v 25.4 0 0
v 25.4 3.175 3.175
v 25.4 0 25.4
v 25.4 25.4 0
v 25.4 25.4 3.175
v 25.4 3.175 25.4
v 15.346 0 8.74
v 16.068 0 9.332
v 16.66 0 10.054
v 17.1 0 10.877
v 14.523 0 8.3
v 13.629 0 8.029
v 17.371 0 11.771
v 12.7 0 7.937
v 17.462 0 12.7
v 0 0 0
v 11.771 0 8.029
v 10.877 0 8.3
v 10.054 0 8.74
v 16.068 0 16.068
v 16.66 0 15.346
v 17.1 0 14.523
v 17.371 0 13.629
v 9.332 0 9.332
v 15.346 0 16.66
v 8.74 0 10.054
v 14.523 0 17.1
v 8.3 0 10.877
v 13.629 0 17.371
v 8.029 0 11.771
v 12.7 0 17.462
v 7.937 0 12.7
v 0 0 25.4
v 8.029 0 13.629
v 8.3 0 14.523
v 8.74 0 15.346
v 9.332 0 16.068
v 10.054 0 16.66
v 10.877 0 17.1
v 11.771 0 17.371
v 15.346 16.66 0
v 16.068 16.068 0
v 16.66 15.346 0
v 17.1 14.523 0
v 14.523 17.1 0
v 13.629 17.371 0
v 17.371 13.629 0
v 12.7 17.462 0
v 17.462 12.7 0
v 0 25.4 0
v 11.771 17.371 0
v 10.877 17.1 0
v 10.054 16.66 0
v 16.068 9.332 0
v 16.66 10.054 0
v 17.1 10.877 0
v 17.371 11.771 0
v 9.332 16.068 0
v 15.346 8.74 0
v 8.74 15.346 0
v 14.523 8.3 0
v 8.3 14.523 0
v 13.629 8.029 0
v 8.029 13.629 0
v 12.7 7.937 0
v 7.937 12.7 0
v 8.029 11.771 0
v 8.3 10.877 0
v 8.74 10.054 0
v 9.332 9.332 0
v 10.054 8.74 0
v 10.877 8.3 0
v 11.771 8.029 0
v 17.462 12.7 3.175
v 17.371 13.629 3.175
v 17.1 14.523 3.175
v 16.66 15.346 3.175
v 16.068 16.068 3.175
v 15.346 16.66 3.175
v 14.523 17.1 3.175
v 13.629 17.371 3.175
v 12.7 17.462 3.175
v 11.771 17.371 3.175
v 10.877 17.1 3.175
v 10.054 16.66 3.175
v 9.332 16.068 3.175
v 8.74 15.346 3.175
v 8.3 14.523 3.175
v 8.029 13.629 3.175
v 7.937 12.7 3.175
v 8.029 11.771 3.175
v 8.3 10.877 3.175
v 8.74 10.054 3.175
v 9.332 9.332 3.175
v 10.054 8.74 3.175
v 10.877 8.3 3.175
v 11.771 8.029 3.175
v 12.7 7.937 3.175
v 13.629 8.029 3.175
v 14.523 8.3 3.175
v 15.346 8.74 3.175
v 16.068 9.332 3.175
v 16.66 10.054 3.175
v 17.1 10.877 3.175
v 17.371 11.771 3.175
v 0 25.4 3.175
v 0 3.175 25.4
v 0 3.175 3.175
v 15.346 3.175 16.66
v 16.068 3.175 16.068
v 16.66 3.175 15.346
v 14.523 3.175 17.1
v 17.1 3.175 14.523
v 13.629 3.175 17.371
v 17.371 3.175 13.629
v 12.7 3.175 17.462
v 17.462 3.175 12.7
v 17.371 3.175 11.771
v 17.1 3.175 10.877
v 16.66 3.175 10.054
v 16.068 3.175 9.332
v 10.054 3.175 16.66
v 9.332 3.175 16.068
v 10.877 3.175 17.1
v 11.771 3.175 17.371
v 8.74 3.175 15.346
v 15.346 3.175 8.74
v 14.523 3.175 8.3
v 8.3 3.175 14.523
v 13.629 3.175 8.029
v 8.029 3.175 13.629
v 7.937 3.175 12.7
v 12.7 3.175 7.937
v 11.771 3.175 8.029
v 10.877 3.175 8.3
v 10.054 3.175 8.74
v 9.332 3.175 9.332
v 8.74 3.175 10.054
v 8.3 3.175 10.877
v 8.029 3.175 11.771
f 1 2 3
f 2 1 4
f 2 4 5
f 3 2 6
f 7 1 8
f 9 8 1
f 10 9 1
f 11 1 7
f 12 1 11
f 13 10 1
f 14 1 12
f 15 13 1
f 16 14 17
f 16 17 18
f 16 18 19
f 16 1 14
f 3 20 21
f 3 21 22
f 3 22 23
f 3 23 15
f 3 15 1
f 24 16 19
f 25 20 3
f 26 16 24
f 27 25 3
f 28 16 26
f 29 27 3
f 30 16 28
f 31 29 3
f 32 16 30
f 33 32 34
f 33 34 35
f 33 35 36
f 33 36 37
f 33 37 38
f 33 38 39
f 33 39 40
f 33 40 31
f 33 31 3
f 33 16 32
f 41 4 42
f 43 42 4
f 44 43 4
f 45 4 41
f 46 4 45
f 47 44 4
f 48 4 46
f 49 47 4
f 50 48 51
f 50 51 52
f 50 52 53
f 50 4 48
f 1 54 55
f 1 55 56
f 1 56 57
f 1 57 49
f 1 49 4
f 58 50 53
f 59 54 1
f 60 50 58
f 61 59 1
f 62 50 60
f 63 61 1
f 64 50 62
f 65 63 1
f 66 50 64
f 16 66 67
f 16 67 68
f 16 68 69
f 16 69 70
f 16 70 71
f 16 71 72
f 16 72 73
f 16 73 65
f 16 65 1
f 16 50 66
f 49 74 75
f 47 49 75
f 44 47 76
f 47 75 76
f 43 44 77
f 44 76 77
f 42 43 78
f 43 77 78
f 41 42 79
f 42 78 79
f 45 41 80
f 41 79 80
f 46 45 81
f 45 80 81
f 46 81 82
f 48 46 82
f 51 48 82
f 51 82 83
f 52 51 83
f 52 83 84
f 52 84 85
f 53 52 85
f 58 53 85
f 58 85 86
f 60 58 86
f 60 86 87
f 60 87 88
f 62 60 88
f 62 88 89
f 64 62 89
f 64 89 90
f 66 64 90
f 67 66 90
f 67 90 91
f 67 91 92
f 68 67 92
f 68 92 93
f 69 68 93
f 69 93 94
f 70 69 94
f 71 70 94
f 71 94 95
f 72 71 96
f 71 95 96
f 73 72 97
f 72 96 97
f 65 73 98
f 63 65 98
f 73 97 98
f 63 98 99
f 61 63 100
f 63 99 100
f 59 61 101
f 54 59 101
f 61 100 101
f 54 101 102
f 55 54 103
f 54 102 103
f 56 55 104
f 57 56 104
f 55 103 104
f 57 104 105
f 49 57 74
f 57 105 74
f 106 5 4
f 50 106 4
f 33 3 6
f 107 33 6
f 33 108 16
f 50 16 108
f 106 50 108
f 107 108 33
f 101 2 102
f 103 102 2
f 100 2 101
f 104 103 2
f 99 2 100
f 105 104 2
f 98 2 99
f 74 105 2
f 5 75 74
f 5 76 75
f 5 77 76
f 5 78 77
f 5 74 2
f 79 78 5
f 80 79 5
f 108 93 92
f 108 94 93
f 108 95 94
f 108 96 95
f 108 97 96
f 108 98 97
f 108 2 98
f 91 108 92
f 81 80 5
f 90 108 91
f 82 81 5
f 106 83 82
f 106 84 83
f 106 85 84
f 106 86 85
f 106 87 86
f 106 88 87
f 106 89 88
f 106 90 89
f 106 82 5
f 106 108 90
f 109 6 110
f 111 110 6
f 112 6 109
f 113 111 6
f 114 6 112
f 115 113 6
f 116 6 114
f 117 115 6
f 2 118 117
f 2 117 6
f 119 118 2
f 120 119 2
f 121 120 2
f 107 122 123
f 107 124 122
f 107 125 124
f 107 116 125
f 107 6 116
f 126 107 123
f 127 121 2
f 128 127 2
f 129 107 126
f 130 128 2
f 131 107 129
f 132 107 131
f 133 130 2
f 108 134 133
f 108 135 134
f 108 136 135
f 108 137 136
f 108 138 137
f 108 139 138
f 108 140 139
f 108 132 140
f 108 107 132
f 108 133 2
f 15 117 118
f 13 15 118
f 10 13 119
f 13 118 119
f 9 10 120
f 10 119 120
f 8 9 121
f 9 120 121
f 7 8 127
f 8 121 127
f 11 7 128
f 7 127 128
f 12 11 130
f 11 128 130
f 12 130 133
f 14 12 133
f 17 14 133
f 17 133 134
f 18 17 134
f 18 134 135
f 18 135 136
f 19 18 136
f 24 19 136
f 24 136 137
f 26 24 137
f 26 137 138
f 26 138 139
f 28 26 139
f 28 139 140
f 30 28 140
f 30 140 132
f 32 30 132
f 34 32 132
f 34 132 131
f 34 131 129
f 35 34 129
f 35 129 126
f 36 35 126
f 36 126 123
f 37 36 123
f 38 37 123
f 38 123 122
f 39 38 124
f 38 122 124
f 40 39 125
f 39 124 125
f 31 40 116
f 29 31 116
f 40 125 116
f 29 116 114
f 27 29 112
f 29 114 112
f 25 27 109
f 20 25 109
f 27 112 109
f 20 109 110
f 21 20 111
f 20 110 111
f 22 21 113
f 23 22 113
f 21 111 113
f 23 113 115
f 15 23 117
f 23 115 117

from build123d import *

# Parameters (mm, degrees)
BOSS_EXTRUDE1_DEPTH = 25.4
SKETCH2_R           = 4.7625
CUT_EXTRUDE1_DEPTH  = 25.4
SKETCH3_R           = 4.7625
CUT_EXTRUDE2_DEPTH  = 4.175


with BuildPart() as part:
    # Sketch1 → Boss-Extrude1 (new body)
    with BuildSketch(Plane(origin=(0, 0, 0), x_dir=(0, 0, -1), z_dir=(1, 0, 0))):
        Polygon((0, 0), (-25.4, 0), (-25.4, 3.175), (-3.175, 3.175), (-3.175, 25.4), (0, 25.4), align=None)
    extrude(amount=BOSS_EXTRUDE1_DEPTH)

    # Sketch2 → Cut-Extrude1 (cut)
    with BuildSketch(Plane(origin=(0, 3.175, 0), x_dir=(1, 0, 0), z_dir=(0, 1, 0))):
        with Locations((12.7, -12.7)):
            Circle(SKETCH2_R)
    extrude(amount=-CUT_EXTRUDE1_DEPTH, mode=Mode.SUBTRACT)

    # Sketch3 → Cut-Extrude2 (cut, through all)
    with BuildSketch(Plane.XY.offset(3.175)):
        with Locations((12.7, 12.7)):
            Circle(SKETCH3_R)
    extrude(amount=-CUT_EXTRUDE2_DEPTH, mode=Mode.SUBTRACT)


solid = part.part
